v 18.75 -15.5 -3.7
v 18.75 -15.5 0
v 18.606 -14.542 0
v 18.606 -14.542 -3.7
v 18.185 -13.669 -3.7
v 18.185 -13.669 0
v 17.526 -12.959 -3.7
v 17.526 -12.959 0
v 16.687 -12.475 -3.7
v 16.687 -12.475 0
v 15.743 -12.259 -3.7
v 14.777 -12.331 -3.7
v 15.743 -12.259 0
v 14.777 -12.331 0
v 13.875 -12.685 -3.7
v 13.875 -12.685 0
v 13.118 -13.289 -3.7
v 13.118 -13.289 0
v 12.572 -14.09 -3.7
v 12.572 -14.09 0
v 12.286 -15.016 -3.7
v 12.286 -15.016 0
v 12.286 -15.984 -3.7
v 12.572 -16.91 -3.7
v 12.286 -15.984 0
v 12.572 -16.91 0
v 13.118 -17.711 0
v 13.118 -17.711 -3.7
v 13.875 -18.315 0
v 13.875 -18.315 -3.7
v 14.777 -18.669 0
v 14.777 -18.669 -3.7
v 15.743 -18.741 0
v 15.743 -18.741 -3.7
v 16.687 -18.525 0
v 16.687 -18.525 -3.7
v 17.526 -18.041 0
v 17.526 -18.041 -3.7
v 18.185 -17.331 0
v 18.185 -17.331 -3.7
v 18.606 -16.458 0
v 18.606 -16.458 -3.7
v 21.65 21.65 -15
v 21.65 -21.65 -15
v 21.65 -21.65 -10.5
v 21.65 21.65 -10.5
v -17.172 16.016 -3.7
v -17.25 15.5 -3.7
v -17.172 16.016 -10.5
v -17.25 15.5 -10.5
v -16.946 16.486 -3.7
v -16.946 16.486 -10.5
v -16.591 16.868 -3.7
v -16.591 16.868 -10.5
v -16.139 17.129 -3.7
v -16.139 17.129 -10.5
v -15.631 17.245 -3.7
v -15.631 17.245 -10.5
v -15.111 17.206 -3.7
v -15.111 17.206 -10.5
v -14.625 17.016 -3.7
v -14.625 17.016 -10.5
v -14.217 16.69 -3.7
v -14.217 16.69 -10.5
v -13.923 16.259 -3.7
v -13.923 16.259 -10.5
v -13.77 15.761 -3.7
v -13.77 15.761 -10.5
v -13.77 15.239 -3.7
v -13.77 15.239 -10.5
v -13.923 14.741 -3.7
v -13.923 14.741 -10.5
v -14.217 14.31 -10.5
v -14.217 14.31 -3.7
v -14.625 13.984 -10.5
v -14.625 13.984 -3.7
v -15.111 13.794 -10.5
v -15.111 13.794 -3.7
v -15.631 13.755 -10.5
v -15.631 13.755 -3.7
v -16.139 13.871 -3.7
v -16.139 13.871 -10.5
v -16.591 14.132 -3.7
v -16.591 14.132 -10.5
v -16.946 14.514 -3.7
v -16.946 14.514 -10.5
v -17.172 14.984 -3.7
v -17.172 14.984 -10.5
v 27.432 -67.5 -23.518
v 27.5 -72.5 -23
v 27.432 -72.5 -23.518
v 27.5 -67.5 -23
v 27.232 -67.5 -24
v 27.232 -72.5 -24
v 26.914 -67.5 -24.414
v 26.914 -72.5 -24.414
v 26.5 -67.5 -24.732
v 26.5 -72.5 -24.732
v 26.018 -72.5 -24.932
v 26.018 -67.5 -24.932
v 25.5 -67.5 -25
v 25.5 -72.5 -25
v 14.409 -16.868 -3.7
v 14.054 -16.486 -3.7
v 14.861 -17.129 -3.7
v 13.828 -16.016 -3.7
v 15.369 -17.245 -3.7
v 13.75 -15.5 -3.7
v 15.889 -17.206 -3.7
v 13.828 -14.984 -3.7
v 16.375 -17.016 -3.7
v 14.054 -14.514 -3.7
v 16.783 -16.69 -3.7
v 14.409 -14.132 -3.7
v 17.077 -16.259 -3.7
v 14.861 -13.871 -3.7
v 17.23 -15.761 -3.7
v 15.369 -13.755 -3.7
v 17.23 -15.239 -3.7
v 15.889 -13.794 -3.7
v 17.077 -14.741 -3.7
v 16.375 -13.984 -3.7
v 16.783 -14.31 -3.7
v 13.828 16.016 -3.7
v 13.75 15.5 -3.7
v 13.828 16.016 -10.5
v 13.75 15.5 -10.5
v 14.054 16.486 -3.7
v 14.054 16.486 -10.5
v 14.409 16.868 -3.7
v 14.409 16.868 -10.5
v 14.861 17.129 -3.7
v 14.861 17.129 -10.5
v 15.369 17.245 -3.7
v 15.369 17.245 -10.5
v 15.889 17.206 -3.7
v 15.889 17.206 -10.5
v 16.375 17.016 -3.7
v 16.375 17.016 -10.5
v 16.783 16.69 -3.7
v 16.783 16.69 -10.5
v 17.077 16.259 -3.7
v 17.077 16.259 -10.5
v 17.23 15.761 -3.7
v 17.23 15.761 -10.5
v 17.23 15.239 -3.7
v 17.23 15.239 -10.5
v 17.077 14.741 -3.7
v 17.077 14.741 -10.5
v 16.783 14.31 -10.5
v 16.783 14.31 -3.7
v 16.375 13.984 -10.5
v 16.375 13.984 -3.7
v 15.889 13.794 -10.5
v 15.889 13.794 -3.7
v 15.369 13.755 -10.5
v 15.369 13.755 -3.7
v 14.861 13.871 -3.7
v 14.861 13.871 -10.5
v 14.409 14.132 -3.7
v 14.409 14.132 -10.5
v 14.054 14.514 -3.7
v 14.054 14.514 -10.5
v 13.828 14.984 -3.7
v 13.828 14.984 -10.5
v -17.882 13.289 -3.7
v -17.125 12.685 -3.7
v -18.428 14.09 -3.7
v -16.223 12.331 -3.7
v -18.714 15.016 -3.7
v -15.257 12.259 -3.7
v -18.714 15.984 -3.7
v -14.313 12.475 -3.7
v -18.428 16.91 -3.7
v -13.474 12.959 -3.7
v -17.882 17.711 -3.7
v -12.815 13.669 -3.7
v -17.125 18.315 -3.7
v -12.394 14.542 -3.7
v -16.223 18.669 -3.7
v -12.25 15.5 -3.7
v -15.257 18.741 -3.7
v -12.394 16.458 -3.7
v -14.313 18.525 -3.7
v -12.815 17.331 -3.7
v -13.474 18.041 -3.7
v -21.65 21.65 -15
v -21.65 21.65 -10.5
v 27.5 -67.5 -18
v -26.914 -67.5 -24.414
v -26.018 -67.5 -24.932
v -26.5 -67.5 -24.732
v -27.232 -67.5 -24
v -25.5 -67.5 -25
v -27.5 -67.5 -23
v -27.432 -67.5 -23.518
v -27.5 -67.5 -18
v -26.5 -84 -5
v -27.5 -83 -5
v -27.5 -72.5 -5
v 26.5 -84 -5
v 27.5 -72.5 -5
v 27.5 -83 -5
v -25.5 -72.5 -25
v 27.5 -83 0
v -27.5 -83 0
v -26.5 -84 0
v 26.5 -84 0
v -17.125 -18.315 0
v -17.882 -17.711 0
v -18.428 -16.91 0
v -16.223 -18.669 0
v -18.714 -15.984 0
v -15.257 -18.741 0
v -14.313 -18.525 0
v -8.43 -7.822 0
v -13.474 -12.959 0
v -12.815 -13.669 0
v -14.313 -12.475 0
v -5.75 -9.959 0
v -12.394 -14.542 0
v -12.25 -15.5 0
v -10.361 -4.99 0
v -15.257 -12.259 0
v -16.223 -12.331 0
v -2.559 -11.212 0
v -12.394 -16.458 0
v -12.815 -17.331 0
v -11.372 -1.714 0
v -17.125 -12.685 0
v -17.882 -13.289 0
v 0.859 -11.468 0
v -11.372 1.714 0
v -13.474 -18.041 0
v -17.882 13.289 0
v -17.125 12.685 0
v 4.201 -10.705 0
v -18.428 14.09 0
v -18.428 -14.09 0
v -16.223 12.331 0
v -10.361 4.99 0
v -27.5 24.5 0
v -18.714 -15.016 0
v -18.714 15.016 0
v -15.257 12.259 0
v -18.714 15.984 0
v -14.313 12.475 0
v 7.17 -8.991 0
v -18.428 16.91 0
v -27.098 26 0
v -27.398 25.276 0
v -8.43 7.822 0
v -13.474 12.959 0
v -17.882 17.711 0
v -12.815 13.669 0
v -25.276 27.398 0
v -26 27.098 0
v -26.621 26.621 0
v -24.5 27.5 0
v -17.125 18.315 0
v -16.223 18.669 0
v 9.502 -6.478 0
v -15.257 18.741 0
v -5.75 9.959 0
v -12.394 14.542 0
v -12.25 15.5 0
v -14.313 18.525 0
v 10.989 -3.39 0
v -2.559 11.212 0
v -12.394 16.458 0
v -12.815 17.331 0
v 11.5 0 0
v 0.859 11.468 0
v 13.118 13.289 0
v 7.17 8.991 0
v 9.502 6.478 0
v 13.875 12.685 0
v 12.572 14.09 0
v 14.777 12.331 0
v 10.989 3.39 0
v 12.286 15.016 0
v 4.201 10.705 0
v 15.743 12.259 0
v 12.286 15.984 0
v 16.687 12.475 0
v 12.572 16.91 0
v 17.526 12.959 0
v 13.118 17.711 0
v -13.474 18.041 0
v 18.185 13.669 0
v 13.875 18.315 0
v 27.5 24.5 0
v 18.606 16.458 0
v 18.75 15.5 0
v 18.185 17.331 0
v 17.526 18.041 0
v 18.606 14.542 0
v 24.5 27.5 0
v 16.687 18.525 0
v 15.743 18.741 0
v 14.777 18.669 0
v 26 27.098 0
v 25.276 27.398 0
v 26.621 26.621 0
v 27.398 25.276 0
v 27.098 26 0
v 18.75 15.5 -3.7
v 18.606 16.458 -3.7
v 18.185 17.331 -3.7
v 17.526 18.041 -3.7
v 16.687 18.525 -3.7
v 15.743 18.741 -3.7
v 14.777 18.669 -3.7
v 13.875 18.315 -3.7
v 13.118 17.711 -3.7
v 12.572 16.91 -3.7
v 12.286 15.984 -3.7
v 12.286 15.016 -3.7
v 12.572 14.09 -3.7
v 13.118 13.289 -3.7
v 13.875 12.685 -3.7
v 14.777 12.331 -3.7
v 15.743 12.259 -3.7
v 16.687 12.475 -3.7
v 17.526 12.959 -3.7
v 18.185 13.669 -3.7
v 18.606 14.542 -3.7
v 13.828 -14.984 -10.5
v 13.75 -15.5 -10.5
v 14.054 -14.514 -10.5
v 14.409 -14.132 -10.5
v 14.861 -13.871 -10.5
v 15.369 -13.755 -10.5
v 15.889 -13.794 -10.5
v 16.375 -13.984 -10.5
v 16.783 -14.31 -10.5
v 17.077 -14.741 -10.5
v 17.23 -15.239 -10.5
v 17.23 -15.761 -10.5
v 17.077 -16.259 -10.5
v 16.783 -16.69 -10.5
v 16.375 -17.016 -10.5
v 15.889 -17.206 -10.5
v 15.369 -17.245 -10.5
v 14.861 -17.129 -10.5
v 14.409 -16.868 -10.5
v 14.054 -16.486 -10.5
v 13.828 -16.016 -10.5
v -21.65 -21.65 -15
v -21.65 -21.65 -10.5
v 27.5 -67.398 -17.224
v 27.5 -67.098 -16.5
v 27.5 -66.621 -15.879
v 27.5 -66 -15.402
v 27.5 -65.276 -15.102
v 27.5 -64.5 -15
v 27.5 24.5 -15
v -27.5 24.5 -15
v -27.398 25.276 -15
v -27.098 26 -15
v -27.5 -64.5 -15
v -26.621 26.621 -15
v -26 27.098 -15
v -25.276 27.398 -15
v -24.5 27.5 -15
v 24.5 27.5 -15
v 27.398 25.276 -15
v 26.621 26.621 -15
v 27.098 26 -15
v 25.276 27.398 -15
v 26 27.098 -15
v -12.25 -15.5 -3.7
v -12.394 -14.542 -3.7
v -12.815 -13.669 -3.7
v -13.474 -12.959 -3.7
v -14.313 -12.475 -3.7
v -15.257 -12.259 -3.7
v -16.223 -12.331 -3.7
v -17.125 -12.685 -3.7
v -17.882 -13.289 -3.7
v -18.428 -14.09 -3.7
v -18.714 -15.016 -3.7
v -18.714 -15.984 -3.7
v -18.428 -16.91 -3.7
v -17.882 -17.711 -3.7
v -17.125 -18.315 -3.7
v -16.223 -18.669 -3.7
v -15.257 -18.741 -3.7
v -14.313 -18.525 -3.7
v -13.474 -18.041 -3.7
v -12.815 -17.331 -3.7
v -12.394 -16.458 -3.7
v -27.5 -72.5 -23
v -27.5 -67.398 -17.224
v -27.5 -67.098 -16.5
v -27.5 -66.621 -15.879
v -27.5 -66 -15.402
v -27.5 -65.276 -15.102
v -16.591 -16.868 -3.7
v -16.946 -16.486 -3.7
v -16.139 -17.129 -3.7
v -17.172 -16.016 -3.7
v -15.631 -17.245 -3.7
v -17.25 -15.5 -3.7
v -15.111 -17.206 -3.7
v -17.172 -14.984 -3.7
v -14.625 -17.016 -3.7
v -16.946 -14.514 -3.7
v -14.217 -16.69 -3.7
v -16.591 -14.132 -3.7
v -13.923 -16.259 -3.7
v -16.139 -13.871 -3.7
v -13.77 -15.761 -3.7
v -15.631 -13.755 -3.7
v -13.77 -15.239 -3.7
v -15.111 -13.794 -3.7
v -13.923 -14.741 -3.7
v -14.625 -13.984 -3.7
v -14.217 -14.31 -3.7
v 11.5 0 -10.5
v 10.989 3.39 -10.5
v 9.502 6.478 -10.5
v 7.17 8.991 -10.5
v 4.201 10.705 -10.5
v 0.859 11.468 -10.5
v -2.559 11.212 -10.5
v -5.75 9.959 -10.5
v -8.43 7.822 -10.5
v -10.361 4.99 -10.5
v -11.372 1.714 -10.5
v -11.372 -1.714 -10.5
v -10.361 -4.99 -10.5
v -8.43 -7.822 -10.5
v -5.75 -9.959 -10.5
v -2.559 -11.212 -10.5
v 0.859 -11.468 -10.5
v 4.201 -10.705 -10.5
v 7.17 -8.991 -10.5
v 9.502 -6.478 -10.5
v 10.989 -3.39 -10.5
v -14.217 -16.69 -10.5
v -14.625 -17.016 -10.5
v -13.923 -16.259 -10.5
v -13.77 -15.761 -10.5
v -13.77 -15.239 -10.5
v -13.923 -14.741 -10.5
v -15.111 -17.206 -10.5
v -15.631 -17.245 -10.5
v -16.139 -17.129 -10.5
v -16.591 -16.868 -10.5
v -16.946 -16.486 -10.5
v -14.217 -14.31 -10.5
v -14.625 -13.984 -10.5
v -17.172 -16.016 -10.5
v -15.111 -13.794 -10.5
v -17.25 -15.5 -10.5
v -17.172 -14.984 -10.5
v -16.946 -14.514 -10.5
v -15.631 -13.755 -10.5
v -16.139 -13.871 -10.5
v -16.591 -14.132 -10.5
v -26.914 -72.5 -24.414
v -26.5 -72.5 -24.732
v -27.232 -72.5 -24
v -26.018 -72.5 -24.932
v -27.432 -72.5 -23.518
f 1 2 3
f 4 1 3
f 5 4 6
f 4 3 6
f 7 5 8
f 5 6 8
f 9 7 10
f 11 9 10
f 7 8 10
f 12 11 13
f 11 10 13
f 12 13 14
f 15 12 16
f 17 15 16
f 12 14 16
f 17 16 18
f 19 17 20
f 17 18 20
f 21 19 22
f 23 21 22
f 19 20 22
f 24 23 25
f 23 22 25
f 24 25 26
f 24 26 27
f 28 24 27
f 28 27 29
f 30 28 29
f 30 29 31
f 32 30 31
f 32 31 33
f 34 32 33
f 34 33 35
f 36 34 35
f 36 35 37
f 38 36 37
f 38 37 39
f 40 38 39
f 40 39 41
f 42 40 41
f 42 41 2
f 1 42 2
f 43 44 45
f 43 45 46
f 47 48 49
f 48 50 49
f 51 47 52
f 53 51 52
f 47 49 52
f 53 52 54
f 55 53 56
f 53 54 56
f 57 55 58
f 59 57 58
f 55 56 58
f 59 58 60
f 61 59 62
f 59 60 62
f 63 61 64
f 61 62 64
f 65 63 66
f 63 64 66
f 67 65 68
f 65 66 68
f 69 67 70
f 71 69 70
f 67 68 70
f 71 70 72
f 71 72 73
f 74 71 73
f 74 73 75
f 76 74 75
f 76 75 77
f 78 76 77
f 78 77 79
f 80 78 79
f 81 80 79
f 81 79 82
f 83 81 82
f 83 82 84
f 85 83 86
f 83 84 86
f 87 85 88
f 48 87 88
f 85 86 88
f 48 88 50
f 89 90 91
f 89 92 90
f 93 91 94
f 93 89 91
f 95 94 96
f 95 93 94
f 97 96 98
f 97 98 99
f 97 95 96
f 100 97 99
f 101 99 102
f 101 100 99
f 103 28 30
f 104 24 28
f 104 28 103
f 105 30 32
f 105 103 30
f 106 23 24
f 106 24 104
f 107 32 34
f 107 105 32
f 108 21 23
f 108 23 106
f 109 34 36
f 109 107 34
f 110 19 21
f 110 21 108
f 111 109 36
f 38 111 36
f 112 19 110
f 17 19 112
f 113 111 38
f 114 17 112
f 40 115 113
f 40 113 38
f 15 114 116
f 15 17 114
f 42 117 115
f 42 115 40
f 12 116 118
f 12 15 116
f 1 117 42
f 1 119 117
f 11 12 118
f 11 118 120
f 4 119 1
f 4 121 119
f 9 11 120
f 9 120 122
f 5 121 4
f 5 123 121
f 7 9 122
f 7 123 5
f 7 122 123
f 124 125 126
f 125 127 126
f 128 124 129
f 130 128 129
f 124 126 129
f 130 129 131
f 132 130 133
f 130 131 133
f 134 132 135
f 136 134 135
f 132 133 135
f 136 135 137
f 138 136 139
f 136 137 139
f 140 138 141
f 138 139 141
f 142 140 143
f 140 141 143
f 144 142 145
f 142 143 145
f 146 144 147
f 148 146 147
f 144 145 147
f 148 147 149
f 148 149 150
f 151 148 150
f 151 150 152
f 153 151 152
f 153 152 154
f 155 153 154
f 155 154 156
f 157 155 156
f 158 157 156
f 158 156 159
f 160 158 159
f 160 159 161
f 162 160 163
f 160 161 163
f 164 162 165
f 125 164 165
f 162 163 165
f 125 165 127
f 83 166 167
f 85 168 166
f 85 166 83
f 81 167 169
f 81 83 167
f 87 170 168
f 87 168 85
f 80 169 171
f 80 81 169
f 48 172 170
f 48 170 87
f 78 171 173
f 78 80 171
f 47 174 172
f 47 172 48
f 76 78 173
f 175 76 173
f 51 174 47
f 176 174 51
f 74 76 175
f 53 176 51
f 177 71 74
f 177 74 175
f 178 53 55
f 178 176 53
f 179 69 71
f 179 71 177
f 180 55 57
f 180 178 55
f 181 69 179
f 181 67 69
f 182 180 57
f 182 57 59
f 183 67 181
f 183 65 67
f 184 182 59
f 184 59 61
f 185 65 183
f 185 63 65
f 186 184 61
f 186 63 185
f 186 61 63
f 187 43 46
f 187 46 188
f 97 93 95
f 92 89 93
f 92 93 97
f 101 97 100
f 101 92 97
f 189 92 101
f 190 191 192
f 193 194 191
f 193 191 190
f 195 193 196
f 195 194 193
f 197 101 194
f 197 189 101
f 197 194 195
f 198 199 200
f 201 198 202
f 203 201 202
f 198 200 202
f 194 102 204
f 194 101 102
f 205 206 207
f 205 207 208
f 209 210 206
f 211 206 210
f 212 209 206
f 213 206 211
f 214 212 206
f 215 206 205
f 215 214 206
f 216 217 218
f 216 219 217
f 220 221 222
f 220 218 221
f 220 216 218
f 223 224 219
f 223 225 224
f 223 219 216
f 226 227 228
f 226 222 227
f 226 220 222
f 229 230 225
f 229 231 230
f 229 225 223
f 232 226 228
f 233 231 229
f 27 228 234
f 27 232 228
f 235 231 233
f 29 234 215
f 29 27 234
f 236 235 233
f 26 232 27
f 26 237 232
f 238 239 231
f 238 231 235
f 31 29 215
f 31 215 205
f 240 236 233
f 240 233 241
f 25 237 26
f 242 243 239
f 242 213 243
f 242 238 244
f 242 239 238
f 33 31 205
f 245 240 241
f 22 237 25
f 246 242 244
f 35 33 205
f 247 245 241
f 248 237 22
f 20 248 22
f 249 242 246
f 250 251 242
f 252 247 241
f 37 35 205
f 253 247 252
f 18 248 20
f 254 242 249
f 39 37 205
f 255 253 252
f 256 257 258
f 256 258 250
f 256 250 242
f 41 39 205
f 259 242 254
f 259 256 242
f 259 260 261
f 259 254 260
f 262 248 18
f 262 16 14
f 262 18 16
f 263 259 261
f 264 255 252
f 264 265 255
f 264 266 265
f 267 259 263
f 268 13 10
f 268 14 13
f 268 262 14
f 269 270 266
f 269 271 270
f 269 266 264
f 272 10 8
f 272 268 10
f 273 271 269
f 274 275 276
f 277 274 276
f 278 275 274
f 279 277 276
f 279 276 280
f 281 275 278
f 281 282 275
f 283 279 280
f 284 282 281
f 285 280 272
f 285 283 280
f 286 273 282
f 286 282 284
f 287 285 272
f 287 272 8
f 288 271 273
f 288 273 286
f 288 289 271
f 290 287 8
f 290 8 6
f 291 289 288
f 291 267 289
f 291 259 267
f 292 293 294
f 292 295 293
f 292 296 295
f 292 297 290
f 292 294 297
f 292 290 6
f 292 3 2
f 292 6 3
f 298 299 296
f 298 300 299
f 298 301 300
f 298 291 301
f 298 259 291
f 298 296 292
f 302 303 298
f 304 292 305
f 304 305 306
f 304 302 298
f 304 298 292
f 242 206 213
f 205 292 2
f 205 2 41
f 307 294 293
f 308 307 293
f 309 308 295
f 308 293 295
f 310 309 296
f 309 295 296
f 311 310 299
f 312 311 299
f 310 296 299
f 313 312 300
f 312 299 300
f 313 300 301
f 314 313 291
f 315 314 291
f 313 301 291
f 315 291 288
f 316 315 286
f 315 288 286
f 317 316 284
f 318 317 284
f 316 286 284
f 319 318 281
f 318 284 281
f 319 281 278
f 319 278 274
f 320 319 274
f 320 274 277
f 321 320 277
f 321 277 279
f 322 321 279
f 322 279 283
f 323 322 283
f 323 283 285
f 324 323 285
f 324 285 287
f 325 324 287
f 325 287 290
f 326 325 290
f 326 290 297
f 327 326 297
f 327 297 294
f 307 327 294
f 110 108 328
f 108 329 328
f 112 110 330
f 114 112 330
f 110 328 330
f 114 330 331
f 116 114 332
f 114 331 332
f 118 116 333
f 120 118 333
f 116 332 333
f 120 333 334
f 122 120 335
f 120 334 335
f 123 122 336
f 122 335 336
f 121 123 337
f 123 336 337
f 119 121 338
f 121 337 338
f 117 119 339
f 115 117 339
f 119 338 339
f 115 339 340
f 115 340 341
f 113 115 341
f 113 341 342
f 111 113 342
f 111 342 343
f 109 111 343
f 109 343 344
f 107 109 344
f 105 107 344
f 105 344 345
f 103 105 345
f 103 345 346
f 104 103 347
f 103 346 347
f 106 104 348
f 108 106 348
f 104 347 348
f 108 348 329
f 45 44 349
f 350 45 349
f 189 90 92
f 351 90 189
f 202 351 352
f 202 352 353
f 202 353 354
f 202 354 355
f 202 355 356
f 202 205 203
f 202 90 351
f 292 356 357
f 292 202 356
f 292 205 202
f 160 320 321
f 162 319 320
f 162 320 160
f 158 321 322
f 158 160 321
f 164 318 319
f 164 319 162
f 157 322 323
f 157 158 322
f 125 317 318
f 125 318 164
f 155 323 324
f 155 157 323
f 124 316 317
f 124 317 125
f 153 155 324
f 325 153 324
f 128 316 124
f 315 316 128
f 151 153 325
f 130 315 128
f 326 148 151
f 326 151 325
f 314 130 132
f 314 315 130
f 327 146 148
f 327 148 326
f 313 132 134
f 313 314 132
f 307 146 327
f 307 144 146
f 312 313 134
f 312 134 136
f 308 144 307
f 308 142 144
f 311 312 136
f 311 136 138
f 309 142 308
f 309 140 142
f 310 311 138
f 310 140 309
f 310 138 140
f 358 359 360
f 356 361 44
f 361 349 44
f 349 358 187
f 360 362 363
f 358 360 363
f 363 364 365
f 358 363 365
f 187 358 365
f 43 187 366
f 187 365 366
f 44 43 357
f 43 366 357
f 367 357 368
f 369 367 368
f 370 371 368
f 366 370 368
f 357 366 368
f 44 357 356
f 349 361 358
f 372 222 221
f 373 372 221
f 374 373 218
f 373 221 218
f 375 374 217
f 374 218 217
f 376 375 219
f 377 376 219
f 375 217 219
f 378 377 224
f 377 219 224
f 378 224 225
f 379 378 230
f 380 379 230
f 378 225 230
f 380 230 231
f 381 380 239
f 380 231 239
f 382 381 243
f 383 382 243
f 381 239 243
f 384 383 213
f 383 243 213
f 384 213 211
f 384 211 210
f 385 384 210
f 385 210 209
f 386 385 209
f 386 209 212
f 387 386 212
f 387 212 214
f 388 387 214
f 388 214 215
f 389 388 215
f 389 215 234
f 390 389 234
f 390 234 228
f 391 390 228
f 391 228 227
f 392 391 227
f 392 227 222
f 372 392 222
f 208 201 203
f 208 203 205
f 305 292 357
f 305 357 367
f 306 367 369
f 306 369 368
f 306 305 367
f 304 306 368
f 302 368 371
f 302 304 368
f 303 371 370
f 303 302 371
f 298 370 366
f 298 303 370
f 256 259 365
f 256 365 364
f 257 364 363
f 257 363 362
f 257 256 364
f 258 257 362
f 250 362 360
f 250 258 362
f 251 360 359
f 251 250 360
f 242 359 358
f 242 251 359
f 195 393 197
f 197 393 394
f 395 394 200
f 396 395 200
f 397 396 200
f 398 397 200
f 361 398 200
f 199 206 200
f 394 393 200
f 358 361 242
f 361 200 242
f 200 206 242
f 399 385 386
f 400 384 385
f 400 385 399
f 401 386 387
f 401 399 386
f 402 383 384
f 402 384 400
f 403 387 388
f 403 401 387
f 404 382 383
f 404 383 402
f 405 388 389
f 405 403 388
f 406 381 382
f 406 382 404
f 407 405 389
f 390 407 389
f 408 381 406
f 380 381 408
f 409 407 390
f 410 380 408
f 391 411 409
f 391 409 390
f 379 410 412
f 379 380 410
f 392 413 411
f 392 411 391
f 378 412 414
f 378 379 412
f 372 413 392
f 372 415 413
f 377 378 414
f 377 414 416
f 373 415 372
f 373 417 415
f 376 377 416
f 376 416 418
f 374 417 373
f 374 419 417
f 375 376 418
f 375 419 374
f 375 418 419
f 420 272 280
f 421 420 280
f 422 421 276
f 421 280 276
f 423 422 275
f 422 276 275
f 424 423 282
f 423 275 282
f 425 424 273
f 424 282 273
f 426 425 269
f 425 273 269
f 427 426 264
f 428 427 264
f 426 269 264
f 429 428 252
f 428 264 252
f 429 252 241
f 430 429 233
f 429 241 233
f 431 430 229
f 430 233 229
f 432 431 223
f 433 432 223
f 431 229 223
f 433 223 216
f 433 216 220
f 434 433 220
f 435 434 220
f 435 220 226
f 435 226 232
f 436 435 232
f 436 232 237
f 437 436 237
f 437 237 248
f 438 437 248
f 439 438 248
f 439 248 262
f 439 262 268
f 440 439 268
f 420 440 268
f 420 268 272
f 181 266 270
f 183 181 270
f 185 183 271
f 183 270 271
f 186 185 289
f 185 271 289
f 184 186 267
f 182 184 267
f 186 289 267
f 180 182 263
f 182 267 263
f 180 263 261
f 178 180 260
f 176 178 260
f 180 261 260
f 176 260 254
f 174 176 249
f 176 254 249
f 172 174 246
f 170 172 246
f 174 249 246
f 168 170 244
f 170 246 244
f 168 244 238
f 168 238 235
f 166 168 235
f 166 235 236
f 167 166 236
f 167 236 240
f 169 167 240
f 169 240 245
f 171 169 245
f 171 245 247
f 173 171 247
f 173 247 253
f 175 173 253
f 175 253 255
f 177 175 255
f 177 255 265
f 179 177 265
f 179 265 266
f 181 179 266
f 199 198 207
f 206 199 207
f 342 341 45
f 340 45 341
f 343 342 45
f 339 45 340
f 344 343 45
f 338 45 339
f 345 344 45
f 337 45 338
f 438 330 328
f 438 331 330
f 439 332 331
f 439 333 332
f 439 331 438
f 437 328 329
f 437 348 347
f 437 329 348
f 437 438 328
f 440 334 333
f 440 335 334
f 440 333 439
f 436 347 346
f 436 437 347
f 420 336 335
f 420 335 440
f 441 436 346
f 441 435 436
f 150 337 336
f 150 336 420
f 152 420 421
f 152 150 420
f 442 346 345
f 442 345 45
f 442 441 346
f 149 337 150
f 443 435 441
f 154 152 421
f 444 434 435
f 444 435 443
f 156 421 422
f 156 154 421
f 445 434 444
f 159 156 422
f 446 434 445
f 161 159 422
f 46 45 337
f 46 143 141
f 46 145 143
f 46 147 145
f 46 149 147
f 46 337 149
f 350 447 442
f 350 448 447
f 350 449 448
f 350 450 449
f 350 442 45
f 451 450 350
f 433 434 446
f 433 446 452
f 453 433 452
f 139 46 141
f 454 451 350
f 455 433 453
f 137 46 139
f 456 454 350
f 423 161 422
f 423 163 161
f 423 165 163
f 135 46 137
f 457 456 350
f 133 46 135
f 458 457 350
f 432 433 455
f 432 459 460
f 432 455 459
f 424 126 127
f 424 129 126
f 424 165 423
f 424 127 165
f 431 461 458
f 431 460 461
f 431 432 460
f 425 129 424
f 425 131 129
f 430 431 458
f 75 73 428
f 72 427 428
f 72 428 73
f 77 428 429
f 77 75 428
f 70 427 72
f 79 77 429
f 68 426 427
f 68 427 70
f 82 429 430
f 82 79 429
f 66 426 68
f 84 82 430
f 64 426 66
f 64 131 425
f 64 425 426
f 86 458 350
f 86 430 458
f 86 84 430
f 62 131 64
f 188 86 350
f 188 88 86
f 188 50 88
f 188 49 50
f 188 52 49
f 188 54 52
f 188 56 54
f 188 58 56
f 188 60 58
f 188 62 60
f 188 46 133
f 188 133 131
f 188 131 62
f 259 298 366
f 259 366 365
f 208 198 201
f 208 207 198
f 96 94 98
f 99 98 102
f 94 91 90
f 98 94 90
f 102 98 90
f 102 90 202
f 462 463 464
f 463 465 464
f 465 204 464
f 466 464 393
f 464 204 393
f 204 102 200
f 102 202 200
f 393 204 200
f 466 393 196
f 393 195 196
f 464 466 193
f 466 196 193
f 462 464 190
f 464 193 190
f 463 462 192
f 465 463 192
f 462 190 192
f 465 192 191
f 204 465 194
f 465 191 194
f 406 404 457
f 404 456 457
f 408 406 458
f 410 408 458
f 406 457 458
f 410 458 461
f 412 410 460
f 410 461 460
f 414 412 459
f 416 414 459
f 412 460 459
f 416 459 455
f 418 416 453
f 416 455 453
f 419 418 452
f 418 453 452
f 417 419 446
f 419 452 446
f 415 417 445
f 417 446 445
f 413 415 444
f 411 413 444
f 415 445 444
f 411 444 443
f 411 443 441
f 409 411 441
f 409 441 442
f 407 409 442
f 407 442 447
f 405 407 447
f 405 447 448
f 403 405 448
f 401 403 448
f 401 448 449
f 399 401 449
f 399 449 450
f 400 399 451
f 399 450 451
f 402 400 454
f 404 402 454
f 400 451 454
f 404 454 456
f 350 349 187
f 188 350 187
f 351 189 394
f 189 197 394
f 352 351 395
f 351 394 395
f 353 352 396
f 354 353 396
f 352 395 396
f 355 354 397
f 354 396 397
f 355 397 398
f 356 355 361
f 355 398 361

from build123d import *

# Parameters (mm, degrees)
SKICA2_R                                         = 11.5
P_IDAT_VYSUNUT_M1_DEPTH                          = 15
SKICA5_W                                         = 55
SKICA5_H                                         = 5
P_IDAT_VYSUNUT_M4_DEPTH                          = 11.5
ZKOSEN_1_SIZE                                    = 1
SKICA6_W                                         = 43.3
SKICA6_H                                         = 43.3
ODEBRAT_VYSUNUT_M1_DEPTH                         = 4.5
V_LCOV_ZAHLOUBEN_PRO_M3_ROUBY_S_VNIT_D           = 3.5
V_LCOV_ZAHLOUBEN_PRO_M3_ROUBY_S_VNIT_CBORE_D     = 6.5
V_LCOV_ZAHLOUBEN_PRO_M3_ROUBY_S_VNIT_CBORE_DEPTH = 3.7
SKICA10_W                                        = 55
SKICA10_H                                        = 5
P_IDAT_VYSUNUT_M5_DEPTH                          = 10
ZAOBLIT1_R                                       = 2
ZAOBLIT2_R                                       = 3


with BuildPart() as part:
    # Skica2 → Přidat vysunutím1 (new body)
    with BuildSketch(Plane.XY):
        with BuildLine():
            Line((-27.5, 24.5), (-27.5, -72.5))
            Line((-27.5, -72.5), (27.5, -72.5))
            Line((27.5, -72.5), (27.5, 24.5))
            ThreePointArc((27.5, 24.5), (26.621320344, 26.621320344), (24.5, 27.5))
            Line((24.5, 27.5), (-24.5, 27.5))
            ThreePointArc((-24.5, 27.5), (-26.621320344, 26.621320344), (-27.5, 24.5))
        make_face()
        Circle(SKICA2_R, mode=Mode.SUBTRACT)
    extrude(amount=-P_IDAT_VYSUNUT_M1_DEPTH)

    # Skica5 → Přidat vysunutím4 (add)
    with BuildSketch(Plane.XZ.offset(72.5)):
        with Locations((0, -2.5)):
            Rectangle(SKICA5_W, SKICA5_H)
    extrude(amount=P_IDAT_VYSUNUT_M4_DEPTH)

    # Zkosení1
    zkosen_1_edges = [part.edges().sort_by_distance(p)[0] for p in [
        (-27.5, -84, -2.5),
        (27.5, -84, -2.5),
    ]]
    chamfer(zkosen_1_edges, length=ZKOSEN_1_SIZE)

    # Skica6 → Odebrat vysunutím1 (cut)
    with BuildSketch(Plane(origin=(0, 0, -15), x_dir=(-1, 0, 0), z_dir=(0, 0, -1))):
        Rectangle(SKICA6_W, SKICA6_H)
    extrude(amount=-ODEBRAT_VYSUNUT_M1_DEPTH, mode=Mode.SUBTRACT)

    # Válcové zahloubení pro M3 šrouby s vnitřním šestihranem1 (through all)
    with Locations(Plane.XY):
        with Locations((15.5, 15.5), (-15.5, -15.5), (-15.5, 15.5), (15.5, -15.5)):
            CounterBoreHole(V_LCOV_ZAHLOUBEN_PRO_M3_ROUBY_S_VNIT_D / 2, V_LCOV_ZAHLOUBEN_PRO_M3_ROUBY_S_VNIT_CBORE_D / 2, V_LCOV_ZAHLOUBEN_PRO_M3_ROUBY_S_VNIT_CBORE_DEPTH)

    # Skica10 → Přidat vysunutím5 (add)
    with BuildSketch(Plane(origin=(0, 0, -15), x_dir=(-1, 0, 0), z_dir=(0, 0, -1))):
        with Locations((0, -70)):
            Rectangle(SKICA10_W, SKICA10_H)
    extrude(amount=P_IDAT_VYSUNUT_M5_DEPTH)

    # Zaoblit1
    zaoblit1_edges = [part.edges().sort_by_distance(p)[0] for p in [
        (27.5, -70, -25),
        (-27.5, -70, -25),
    ]]
    fillet(zaoblit1_edges, radius=ZAOBLIT1_R)

    # Zaoblit2
    zaoblit2_edges = [part.edges().sort_by_distance(p)[0] for p in [
        (0, -67.5, -15),
    ]]
    fillet(zaoblit2_edges, radius=ZAOBLIT2_R)


solid = part.part
